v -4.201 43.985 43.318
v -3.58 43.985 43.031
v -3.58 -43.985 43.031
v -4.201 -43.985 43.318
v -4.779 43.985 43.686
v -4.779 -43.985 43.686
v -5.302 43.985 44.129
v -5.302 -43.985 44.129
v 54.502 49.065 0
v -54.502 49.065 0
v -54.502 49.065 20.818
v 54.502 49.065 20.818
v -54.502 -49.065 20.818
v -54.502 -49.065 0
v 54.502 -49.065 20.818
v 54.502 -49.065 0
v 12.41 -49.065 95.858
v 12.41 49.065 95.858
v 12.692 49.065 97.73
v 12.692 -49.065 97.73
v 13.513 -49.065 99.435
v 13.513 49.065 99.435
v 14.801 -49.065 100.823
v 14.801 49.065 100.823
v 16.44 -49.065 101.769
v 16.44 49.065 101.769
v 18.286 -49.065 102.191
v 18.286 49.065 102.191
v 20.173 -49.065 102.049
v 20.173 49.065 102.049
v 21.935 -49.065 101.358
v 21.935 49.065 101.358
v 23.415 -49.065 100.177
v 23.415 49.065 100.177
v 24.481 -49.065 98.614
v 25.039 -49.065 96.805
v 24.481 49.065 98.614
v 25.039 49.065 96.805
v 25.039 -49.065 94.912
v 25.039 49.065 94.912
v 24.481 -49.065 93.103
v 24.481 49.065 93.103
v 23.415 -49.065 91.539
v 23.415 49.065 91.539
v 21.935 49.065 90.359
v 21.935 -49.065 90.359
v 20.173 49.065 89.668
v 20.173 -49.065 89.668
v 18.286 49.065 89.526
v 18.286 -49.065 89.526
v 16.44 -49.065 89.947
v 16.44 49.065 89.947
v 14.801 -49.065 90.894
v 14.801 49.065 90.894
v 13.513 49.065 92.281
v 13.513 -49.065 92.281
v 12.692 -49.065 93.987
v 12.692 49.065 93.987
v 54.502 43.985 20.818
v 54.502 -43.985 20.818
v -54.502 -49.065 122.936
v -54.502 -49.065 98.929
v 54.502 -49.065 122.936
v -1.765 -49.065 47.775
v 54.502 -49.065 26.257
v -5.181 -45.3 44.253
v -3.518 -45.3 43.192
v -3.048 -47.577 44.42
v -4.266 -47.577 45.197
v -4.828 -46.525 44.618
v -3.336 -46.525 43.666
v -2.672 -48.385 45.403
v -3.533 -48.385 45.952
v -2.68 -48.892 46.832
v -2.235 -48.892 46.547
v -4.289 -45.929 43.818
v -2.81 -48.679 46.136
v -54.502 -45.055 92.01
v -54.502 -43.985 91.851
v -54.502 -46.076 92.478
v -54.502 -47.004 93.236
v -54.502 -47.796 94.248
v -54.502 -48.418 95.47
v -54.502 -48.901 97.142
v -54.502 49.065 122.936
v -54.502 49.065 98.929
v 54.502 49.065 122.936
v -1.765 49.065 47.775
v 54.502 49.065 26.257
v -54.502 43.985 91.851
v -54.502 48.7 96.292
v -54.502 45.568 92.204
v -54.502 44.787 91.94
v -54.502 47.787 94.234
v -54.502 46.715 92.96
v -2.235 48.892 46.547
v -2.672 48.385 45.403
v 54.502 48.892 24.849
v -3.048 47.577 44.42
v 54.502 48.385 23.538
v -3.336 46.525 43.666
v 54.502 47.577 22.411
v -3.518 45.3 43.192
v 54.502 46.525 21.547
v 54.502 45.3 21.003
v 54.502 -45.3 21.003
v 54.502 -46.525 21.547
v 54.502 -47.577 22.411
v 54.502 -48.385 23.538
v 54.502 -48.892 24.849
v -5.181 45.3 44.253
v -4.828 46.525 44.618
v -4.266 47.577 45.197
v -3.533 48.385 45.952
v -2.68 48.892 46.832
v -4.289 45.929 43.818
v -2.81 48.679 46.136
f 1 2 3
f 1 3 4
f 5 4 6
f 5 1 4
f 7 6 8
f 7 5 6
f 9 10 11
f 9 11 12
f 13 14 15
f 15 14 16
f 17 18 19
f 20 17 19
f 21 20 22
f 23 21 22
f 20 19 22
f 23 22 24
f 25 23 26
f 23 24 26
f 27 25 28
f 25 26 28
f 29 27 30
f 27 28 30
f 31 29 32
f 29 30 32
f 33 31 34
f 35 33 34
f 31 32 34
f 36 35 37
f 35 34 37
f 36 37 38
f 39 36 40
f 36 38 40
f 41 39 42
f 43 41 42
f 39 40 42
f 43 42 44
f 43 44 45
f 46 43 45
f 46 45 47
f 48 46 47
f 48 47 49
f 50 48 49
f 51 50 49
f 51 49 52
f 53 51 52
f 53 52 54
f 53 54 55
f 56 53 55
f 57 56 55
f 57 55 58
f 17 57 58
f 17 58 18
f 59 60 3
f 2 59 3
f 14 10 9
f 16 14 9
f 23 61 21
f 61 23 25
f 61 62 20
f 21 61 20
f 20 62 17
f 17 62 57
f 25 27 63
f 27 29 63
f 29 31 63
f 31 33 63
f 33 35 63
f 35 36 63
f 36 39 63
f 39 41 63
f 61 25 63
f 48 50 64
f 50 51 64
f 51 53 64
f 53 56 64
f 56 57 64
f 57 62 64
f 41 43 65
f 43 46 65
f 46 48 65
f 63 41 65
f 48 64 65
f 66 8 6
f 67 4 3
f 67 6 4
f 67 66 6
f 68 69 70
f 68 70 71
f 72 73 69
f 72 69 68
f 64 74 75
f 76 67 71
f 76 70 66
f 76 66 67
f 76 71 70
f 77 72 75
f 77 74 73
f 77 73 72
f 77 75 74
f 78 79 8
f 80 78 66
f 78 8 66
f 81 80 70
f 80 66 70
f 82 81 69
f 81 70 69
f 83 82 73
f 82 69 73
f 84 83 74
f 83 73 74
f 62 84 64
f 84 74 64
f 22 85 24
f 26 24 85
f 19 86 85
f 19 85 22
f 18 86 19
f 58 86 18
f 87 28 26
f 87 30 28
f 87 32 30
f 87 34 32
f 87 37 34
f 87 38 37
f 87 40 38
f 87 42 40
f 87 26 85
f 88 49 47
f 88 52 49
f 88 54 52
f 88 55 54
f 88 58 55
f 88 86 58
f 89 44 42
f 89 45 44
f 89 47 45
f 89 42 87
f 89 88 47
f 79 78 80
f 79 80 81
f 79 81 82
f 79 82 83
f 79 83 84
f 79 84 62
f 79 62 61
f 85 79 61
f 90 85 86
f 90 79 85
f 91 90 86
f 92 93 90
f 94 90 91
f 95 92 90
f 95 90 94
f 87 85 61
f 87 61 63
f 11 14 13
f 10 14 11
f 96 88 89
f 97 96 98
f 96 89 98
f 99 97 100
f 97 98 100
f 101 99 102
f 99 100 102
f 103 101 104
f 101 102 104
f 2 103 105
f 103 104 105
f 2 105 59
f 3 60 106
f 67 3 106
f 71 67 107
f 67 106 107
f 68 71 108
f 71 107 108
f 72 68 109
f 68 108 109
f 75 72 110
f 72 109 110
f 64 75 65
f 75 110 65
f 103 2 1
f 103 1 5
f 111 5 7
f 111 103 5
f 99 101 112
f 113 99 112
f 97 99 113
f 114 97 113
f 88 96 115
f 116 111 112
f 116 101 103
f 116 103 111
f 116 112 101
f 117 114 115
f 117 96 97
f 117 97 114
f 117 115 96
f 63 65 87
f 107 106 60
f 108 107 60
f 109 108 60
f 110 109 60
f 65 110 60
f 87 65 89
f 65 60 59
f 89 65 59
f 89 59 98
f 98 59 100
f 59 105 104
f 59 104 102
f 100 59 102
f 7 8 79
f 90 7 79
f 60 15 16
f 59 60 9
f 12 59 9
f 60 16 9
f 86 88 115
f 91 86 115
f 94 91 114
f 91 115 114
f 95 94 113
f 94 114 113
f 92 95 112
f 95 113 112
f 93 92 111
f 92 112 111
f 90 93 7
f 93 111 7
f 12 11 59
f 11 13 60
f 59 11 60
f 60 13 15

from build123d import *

# Parameters (mm, degrees)
F0_W         = 109.0031713247
F0_H         = 98.1307327747
F1_DEPTH     = 122.936
F3_DEPTH     = 228.6
F4_T1_DEPTH  = 81.2422372146
F4_T3_DEPTH  = 74.8836801522
F4_T5_DEPTH  = 87.9707327747
F4_T10_DEPTH = 5.08
F4_T16_DEPTH = 5.08
F6_D         = 12.7


# Not quite as in the source:
# - a fillet or chamfer that OpenCascade refuses, or shapes differently, is made with other operations: its cross-section is extruded or revolved along the edge and cut away or added


with BuildPart() as f1:
    # F0 (on Top) → F1 (new body)
    with BuildSketch(Plane.XY):
        Rectangle(F0_W, F0_H)
    extrude(amount=F1_DEPTH)

    # F2 (on face) → F3 (cut)
    with BuildSketch(Plane.XZ.offset(49.0653663874)):
        Polygon((-4.5534134842, 43.4030257165), (-54.5015856624, 91.8513536453), (-54.5015856624, 20.8180882037), (54.5015856624, 20.8180882037), align=None)
    extrude(amount=-F3_DEPTH, mode=Mode.SUBTRACT)

    # F4: fillet of radius 5.08 on 5 edges, made by hand

    # F4_s2 → F4_t1 (cut)
    with BuildSketch(Plane(origin=(-24.7859642555, 0, 24.0416910552), x_dir=(0, 1, 0), z_dir=(-0.7178017282, 0, 0.6962475702))):
        with BuildLine():
            ThreePointArc((49.0653663874, -33.0644637933), (47.5774688358, -29.4723613449), (43.9853663874, -27.9844637933))
            Line((43.9853663874, -27.9844637933), (49.0653663874, -27.9844637933))
            Line((49.0653663874, -27.9844637933), (49.0653663874, -33.0644637933))
        make_face()
        with BuildLine():
            ThreePointArc((-43.9853663874, -27.9844637933), (-47.5774688358, -29.4723613449), (-49.0653663874, -33.0644637933))
            Line((-49.0653663874, -33.0644637933), (-49.0653663874, -27.9844637933))
            Line((-49.0653663874, -27.9844637933), (-43.9853663874, -27.9844637933))
        make_face()
    extrude(amount=F4_T1_DEPTH, mode=Mode.SUBTRACT)

    # F4_s4 → F4_t3 (cut)
    with BuildSketch(Plane(origin=(52.4636836536, 0, -20.0641611063), x_dir=(0, 1, 0), z_dir=(-0.9340250041, 0, 0.3572076311))):
        with BuildLine():
            ThreePointArc((49.0653663874, -43.9929972277), (47.5774688358, -40.4008947793), (43.9853663874, -38.9129972277))
            Line((43.9853663874, -38.9129972277), (49.0653663874, -38.9129972277))
            Line((49.0653663874, -38.9129972277), (49.0653663874, -43.9929972277))
        make_face()
        with BuildLine():
            ThreePointArc((-43.9853663874, -38.9129972277), (-47.5774688358, -40.4008947793), (-49.0653663874, -43.9929972277))
            Line((-49.0653663874, -43.9929972277), (-49.0653663874, -38.9129972277))
            Line((-49.0653663874, -38.9129972277), (-43.9853663874, -38.9129972277))
        make_face()
    extrude(amount=F4_T3_DEPTH, mode=Mode.SUBTRACT)

    # F4_s6 → F4_t5 (cut)
    with BuildSketch(Plane.XZ.offset(-43.9853663874)):
        with BuildLine():
            ThreePointArc((-3.5795264455, 43.0305732869), (-4.4964692561, 43.4923147515), (-5.3018493359, 44.1289875285))
            Line((-5.3018493359, 44.1289875285), (-4.5534134842, 43.4030257165))
            Line((-4.5534134842, 43.4030257165), (-3.5795264455, 43.0305732869))
        make_face()
    extrude(amount=F4_T5_DEPTH, mode=Mode.SUBTRACT)


with BuildPart() as f4_tool8:
    # F4_s9 → F4_t10 (new body)
    with BuildSketch(Plane.XZ.offset(-43.9853663874)):
        Polygon((-1.7649116793, 47.7754203077), (-3.5795264455, 43.0305732869), (-4.5534134842, 43.4030257165), (-5.3018493359, 44.1289875285), align=None)
    extrude(amount=-F4_T10_DEPTH)

    # F4_s11 → F4_t12 (revolve, cut)
    with BuildSketch(Plane(origin=(-1.7649116793, 43.9853663874, 47.7754203077), x_dir=(0.5377081844, 0, 0.843131015), z_dir=(-0.843131015, 0, 0.5377081844))):
        with BuildLine():
            ThreePointArc((0, -5.08), (5.08, 0), (0, 5.08))
            Line((0, 5.08), (0, -5.08))
        make_face()
    revolve(axis=Axis((-1.7649116793, 43.9853663874, 47.7754203077), (0, 1, 0)), mode=Mode.SUBTRACT)


with BuildPart() as f1_1:
    add(f1.part)

    # F4_t7: cut F4_tool8
    add(f4_tool8.part, mode=Mode.SUBTRACT)


with BuildPart() as f4_tool14:
    # F4_s15 → F4_t16 (new body)
    with BuildSketch(Plane.XZ.offset(43.9853663874)):
        Polygon((-1.7649116793, 47.7754203077), (-3.5795264455, 43.0305732869), (-4.5534134842, 43.4030257165), (-5.3018493359, 44.1289875285), align=None)
    extrude(amount=F4_T16_DEPTH)

    # F4_s17 → F4_t18 (revolve, cut)
    with BuildSketch(Plane(origin=(-1.7649116793, -43.9853663874, 47.7754203077), x_dir=(0.5377081844, 0, 0.843131015), z_dir=(0.843131015, 0, -0.5377081844))):
        with BuildLine():
            ThreePointArc((0, -5.08), (5.08, 0), (0, 5.08))
            Line((0, 5.08), (0, -5.08))
        make_face()
    revolve(axis=Axis((-1.7649116793, -43.9853663874, 47.7754203077), (0, -1, 0)), mode=Mode.SUBTRACT)


with BuildPart() as f1_2:
    add(f1_1.part)

    # F4_t13: cut F4_tool14
    add(f4_tool14.part, mode=Mode.SUBTRACT)

    # F6 (through all)
    with Locations(Plane.XZ.offset(49.0653663874)):
        with Locations((18.7600683421, 95.8583652973)):
            Hole(F6_D / 2)


solid = f1_2.part
